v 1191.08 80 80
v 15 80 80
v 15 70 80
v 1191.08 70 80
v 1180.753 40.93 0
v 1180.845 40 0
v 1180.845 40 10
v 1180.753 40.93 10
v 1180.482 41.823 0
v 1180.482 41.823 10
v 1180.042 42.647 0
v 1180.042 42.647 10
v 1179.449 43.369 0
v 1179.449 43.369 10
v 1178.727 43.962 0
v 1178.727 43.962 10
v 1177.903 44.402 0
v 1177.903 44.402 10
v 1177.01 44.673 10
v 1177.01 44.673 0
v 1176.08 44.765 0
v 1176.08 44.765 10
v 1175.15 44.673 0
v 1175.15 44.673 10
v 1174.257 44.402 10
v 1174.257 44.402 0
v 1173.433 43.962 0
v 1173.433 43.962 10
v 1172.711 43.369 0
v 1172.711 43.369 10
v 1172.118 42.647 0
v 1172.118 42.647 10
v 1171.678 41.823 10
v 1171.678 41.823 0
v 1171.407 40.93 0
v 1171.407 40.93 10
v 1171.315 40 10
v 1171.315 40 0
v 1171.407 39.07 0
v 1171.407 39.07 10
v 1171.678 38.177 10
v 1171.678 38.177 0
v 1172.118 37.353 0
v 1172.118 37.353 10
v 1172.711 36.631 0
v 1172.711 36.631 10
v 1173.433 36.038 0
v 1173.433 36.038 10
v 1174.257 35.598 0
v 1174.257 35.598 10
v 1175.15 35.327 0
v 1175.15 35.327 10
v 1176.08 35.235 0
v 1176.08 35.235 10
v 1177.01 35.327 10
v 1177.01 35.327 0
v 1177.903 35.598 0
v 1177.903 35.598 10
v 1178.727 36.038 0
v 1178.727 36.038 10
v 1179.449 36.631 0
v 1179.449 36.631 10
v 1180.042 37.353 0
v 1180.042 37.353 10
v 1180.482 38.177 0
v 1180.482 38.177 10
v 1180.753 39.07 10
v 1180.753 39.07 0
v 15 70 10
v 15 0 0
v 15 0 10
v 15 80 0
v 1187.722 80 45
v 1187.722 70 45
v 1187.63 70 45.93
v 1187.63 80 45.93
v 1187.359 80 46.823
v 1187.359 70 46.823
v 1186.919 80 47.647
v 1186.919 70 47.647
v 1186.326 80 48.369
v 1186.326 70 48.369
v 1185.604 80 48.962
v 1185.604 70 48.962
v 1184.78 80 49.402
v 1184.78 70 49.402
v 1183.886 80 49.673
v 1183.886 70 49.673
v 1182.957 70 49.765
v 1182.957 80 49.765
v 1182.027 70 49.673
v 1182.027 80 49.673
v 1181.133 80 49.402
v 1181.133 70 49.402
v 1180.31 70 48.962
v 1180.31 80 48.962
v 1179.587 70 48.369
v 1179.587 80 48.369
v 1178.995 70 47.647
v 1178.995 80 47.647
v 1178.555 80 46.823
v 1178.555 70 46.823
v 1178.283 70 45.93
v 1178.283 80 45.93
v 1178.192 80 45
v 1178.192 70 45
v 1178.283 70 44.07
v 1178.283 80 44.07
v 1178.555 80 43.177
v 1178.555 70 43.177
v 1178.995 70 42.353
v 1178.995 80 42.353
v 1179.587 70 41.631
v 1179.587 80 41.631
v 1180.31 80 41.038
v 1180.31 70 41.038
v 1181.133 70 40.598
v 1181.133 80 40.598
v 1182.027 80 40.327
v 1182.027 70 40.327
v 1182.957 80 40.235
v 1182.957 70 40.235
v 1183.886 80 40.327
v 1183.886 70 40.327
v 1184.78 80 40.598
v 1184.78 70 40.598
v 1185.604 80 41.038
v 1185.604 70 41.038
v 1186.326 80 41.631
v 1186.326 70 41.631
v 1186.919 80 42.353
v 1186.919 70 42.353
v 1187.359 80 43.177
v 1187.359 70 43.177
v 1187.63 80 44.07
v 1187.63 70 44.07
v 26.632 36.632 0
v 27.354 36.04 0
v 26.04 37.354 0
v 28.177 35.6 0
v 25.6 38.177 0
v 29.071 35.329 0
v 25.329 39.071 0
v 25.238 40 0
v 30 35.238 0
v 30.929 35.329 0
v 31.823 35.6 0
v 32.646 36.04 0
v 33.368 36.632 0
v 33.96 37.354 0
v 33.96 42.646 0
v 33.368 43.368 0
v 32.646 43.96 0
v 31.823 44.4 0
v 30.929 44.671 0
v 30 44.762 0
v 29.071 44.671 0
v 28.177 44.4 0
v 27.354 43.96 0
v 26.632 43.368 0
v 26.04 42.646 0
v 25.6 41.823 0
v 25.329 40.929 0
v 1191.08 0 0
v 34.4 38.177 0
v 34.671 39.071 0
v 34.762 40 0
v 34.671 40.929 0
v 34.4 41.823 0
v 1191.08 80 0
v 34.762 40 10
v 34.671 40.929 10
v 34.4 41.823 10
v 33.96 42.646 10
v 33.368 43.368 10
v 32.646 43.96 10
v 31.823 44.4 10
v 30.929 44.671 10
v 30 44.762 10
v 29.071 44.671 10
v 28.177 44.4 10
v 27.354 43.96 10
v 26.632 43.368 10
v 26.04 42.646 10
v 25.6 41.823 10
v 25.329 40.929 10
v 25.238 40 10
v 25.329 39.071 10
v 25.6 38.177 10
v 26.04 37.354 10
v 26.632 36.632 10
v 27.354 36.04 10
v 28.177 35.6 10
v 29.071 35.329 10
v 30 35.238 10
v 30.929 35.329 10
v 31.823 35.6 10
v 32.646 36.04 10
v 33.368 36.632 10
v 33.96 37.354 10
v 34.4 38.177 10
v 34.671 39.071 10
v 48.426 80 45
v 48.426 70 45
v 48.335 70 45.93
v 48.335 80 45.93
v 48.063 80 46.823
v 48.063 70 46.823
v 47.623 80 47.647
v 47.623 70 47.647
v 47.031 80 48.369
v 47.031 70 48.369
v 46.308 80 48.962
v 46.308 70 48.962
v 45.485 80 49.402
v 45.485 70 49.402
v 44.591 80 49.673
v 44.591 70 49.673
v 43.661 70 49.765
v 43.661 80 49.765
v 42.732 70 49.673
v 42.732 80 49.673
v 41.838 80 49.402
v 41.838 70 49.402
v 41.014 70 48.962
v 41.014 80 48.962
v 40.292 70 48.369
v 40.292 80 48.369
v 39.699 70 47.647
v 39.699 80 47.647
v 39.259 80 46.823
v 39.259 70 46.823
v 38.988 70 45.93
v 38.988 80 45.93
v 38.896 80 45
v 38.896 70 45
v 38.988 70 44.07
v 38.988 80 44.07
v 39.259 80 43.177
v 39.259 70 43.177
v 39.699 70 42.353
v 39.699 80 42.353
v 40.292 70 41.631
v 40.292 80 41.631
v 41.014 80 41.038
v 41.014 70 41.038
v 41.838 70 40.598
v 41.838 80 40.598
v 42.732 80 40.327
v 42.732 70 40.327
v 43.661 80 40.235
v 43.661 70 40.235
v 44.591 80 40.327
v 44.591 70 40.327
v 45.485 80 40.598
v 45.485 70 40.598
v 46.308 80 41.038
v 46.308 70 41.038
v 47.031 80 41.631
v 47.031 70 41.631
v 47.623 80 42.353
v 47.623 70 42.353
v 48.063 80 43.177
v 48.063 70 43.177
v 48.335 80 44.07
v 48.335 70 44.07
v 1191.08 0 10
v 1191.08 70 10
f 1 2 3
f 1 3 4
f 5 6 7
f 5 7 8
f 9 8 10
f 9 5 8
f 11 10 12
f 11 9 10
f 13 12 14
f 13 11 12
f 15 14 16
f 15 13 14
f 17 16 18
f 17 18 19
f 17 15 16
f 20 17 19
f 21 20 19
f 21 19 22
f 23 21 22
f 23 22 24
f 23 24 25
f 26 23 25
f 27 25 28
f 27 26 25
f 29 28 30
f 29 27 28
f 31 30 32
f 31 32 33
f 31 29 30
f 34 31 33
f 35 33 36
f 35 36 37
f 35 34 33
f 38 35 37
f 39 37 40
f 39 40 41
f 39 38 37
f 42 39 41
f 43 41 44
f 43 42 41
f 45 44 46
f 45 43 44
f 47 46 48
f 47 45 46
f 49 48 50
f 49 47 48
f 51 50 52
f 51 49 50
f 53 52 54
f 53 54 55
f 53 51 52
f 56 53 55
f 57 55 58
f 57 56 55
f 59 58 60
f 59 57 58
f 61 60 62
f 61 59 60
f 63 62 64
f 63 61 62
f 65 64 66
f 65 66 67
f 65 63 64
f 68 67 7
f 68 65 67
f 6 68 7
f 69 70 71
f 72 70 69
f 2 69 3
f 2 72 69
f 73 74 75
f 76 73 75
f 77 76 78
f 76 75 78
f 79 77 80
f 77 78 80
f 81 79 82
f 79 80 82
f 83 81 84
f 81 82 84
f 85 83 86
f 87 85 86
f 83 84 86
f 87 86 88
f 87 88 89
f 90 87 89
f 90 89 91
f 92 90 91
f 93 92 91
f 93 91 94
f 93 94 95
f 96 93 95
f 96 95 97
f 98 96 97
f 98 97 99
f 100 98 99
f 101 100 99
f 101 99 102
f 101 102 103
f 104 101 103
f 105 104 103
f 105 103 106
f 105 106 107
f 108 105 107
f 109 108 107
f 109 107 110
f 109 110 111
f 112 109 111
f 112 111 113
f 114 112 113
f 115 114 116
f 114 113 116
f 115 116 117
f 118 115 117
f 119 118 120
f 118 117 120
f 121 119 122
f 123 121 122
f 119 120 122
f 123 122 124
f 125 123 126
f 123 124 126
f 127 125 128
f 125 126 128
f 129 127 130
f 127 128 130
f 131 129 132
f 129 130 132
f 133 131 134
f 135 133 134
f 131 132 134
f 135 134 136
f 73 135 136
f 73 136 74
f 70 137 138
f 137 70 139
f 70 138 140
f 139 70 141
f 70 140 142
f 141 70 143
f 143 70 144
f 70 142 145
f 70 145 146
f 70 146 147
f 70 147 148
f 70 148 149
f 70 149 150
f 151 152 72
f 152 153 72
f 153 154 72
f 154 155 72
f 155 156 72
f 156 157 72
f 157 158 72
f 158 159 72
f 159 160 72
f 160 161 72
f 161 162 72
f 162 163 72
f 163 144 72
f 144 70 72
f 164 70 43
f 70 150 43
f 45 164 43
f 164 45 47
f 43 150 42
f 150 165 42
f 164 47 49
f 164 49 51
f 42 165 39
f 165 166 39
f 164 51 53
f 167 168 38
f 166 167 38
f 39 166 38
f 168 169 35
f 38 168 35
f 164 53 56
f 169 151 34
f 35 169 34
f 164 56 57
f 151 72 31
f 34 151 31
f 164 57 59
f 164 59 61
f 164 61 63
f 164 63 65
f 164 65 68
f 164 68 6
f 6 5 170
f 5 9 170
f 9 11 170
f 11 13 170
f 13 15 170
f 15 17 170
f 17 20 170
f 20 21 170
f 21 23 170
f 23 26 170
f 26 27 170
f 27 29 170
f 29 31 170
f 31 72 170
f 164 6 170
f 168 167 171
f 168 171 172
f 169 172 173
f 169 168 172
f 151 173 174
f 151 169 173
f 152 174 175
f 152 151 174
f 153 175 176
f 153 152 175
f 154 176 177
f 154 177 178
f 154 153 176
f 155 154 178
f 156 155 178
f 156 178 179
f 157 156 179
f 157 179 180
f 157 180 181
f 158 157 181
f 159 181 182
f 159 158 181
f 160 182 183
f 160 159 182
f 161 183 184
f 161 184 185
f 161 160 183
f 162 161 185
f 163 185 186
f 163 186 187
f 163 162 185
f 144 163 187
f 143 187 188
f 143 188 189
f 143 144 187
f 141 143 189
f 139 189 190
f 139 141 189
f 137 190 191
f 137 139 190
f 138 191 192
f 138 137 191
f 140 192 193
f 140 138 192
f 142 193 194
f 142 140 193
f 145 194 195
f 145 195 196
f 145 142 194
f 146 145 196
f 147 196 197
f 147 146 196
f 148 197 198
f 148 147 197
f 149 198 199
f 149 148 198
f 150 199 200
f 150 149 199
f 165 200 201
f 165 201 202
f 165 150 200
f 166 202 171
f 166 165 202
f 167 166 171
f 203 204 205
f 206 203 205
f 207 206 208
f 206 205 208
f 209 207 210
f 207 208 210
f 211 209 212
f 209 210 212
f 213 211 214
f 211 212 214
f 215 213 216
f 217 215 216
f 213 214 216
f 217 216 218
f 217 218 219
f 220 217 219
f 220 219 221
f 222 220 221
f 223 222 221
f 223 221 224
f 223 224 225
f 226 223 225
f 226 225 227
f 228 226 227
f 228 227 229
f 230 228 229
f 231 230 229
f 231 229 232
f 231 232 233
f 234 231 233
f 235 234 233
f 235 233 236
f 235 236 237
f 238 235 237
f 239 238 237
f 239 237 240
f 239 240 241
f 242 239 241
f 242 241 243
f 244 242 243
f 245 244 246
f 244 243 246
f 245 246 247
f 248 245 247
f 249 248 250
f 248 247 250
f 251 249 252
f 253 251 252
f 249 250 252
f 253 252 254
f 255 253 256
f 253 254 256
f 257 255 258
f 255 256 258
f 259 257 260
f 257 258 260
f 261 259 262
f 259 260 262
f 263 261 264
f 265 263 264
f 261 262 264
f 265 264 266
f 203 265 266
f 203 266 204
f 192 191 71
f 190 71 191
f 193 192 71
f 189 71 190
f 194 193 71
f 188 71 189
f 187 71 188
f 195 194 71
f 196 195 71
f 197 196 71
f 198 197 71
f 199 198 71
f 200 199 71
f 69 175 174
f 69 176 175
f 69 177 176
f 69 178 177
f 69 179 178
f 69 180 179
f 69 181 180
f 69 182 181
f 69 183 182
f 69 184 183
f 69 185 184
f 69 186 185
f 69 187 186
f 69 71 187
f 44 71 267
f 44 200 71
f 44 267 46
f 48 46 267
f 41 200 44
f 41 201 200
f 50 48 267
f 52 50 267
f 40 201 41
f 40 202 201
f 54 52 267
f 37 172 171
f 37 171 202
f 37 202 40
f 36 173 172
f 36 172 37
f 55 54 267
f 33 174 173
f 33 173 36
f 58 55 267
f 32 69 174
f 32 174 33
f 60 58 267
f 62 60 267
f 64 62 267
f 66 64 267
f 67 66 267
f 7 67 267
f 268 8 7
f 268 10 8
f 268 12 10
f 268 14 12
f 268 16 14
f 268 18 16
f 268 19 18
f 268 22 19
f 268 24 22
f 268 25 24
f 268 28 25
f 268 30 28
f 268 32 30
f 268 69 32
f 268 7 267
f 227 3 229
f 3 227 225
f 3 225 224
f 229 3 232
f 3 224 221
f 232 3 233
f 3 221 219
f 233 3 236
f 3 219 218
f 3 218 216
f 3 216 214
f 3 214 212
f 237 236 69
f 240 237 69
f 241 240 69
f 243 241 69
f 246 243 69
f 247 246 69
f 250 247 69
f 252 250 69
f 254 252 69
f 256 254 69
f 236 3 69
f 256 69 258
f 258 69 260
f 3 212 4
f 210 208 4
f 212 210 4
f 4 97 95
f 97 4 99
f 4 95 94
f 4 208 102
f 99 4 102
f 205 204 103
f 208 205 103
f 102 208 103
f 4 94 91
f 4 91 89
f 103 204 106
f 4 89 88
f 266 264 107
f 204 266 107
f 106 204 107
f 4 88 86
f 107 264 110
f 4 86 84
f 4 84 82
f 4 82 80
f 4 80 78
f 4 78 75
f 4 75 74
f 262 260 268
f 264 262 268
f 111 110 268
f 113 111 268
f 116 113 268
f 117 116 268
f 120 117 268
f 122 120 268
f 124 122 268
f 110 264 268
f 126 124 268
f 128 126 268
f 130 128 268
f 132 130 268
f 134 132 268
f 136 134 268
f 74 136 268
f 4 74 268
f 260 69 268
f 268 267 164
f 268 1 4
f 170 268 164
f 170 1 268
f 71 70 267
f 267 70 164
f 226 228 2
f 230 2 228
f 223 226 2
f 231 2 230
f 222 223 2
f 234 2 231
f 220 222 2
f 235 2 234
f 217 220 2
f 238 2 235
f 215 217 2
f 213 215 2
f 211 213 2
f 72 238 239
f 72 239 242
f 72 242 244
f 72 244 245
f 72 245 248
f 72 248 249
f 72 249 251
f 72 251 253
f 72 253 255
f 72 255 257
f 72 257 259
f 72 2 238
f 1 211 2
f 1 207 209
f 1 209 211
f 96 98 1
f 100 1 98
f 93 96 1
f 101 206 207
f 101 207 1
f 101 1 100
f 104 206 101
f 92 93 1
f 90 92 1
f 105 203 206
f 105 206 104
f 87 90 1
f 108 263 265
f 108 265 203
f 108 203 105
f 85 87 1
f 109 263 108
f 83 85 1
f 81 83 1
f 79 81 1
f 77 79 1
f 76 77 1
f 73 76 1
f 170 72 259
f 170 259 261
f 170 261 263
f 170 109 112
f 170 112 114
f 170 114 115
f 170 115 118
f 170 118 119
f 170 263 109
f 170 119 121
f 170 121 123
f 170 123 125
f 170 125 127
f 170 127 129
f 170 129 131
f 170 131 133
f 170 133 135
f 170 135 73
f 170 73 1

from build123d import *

# Parameters (mm, degrees)
CROQUIS1_W              = 1206.08
CROQUIS1_H              = 80
CROQUIS1_R              = 4.7625
CROQUIS1_R_2            = 4.765
SALIENTE_EXTRUIR1_DEPTH = 10
CROQUIS2_W              = 1206.08
CROQUIS2_H              = 10
SALIENTE_EXTRUIR2_DEPTH = 70
CROQUIS3_R              = 4.765
CORTAR_EXTRUIR1_DEPTH   = 1211.755535358
CORTAR_EXTRUIR2_DEPTH   = 15
CORTAR_EXTRUIR3_DEPTH   = 15


with BuildPart() as part:
    # Croquis1 → Saliente-Extruir1 (new body)
    with BuildSketch(Plane.XY):
        with Locations((603.04, 40)):
            Rectangle(CROQUIS1_W, CROQUIS1_H)
        with Locations((30, 40)):
            Circle(CROQUIS1_R, mode=Mode.SUBTRACT)
        with Locations((1176.08, 40)):
            Circle(CROQUIS1_R_2, mode=Mode.SUBTRACT)
    extrude(amount=SALIENTE_EXTRUIR1_DEPTH)

    # Croquis2 → Saliente-Extruir2 (add)
    with BuildSketch(Plane.XY.offset(10)):
        with Locations((603.04, 75)):
            Rectangle(CROQUIS2_W, CROQUIS2_H)
    extrude(amount=SALIENTE_EXTRUIR2_DEPTH)

    # Croquis3 → Cortar-Extruir1 (cut, through all)
    with BuildSketch(Plane.XZ.offset(-70)):
        with Locations((1182.956834807, 45)):
            Circle(CROQUIS3_R)
        with Locations((43.661184758, 45)):
            Circle(CROQUIS3_R)
    extrude(amount=-CORTAR_EXTRUIR1_DEPTH, mode=Mode.SUBTRACT)

    # Croquis4 → Cortar-Extruir2 (cut)
    with BuildSketch(Plane(origin=(1206.08, 0, 0), x_dir=(0, 0, -1), z_dir=(1, 0, 0))):
        Polygon((-10, 0), (0, 0), (0, 80), (-80, 80), (-80, 70), (-10, 70), align=None)
    extrude(amount=-CORTAR_EXTRUIR2_DEPTH, mode=Mode.SUBTRACT)

    # Croquis5 → Cortar-Extruir3 (cut)
    with BuildSketch(Plane.ZY):
        Polygon((0, 80), (0, 0), (10, 0), (10, 70), (80, 70), (80, 80), align=None)
    extrude(amount=-CORTAR_EXTRUIR3_DEPTH, mode=Mode.SUBTRACT)


solid = part.part
